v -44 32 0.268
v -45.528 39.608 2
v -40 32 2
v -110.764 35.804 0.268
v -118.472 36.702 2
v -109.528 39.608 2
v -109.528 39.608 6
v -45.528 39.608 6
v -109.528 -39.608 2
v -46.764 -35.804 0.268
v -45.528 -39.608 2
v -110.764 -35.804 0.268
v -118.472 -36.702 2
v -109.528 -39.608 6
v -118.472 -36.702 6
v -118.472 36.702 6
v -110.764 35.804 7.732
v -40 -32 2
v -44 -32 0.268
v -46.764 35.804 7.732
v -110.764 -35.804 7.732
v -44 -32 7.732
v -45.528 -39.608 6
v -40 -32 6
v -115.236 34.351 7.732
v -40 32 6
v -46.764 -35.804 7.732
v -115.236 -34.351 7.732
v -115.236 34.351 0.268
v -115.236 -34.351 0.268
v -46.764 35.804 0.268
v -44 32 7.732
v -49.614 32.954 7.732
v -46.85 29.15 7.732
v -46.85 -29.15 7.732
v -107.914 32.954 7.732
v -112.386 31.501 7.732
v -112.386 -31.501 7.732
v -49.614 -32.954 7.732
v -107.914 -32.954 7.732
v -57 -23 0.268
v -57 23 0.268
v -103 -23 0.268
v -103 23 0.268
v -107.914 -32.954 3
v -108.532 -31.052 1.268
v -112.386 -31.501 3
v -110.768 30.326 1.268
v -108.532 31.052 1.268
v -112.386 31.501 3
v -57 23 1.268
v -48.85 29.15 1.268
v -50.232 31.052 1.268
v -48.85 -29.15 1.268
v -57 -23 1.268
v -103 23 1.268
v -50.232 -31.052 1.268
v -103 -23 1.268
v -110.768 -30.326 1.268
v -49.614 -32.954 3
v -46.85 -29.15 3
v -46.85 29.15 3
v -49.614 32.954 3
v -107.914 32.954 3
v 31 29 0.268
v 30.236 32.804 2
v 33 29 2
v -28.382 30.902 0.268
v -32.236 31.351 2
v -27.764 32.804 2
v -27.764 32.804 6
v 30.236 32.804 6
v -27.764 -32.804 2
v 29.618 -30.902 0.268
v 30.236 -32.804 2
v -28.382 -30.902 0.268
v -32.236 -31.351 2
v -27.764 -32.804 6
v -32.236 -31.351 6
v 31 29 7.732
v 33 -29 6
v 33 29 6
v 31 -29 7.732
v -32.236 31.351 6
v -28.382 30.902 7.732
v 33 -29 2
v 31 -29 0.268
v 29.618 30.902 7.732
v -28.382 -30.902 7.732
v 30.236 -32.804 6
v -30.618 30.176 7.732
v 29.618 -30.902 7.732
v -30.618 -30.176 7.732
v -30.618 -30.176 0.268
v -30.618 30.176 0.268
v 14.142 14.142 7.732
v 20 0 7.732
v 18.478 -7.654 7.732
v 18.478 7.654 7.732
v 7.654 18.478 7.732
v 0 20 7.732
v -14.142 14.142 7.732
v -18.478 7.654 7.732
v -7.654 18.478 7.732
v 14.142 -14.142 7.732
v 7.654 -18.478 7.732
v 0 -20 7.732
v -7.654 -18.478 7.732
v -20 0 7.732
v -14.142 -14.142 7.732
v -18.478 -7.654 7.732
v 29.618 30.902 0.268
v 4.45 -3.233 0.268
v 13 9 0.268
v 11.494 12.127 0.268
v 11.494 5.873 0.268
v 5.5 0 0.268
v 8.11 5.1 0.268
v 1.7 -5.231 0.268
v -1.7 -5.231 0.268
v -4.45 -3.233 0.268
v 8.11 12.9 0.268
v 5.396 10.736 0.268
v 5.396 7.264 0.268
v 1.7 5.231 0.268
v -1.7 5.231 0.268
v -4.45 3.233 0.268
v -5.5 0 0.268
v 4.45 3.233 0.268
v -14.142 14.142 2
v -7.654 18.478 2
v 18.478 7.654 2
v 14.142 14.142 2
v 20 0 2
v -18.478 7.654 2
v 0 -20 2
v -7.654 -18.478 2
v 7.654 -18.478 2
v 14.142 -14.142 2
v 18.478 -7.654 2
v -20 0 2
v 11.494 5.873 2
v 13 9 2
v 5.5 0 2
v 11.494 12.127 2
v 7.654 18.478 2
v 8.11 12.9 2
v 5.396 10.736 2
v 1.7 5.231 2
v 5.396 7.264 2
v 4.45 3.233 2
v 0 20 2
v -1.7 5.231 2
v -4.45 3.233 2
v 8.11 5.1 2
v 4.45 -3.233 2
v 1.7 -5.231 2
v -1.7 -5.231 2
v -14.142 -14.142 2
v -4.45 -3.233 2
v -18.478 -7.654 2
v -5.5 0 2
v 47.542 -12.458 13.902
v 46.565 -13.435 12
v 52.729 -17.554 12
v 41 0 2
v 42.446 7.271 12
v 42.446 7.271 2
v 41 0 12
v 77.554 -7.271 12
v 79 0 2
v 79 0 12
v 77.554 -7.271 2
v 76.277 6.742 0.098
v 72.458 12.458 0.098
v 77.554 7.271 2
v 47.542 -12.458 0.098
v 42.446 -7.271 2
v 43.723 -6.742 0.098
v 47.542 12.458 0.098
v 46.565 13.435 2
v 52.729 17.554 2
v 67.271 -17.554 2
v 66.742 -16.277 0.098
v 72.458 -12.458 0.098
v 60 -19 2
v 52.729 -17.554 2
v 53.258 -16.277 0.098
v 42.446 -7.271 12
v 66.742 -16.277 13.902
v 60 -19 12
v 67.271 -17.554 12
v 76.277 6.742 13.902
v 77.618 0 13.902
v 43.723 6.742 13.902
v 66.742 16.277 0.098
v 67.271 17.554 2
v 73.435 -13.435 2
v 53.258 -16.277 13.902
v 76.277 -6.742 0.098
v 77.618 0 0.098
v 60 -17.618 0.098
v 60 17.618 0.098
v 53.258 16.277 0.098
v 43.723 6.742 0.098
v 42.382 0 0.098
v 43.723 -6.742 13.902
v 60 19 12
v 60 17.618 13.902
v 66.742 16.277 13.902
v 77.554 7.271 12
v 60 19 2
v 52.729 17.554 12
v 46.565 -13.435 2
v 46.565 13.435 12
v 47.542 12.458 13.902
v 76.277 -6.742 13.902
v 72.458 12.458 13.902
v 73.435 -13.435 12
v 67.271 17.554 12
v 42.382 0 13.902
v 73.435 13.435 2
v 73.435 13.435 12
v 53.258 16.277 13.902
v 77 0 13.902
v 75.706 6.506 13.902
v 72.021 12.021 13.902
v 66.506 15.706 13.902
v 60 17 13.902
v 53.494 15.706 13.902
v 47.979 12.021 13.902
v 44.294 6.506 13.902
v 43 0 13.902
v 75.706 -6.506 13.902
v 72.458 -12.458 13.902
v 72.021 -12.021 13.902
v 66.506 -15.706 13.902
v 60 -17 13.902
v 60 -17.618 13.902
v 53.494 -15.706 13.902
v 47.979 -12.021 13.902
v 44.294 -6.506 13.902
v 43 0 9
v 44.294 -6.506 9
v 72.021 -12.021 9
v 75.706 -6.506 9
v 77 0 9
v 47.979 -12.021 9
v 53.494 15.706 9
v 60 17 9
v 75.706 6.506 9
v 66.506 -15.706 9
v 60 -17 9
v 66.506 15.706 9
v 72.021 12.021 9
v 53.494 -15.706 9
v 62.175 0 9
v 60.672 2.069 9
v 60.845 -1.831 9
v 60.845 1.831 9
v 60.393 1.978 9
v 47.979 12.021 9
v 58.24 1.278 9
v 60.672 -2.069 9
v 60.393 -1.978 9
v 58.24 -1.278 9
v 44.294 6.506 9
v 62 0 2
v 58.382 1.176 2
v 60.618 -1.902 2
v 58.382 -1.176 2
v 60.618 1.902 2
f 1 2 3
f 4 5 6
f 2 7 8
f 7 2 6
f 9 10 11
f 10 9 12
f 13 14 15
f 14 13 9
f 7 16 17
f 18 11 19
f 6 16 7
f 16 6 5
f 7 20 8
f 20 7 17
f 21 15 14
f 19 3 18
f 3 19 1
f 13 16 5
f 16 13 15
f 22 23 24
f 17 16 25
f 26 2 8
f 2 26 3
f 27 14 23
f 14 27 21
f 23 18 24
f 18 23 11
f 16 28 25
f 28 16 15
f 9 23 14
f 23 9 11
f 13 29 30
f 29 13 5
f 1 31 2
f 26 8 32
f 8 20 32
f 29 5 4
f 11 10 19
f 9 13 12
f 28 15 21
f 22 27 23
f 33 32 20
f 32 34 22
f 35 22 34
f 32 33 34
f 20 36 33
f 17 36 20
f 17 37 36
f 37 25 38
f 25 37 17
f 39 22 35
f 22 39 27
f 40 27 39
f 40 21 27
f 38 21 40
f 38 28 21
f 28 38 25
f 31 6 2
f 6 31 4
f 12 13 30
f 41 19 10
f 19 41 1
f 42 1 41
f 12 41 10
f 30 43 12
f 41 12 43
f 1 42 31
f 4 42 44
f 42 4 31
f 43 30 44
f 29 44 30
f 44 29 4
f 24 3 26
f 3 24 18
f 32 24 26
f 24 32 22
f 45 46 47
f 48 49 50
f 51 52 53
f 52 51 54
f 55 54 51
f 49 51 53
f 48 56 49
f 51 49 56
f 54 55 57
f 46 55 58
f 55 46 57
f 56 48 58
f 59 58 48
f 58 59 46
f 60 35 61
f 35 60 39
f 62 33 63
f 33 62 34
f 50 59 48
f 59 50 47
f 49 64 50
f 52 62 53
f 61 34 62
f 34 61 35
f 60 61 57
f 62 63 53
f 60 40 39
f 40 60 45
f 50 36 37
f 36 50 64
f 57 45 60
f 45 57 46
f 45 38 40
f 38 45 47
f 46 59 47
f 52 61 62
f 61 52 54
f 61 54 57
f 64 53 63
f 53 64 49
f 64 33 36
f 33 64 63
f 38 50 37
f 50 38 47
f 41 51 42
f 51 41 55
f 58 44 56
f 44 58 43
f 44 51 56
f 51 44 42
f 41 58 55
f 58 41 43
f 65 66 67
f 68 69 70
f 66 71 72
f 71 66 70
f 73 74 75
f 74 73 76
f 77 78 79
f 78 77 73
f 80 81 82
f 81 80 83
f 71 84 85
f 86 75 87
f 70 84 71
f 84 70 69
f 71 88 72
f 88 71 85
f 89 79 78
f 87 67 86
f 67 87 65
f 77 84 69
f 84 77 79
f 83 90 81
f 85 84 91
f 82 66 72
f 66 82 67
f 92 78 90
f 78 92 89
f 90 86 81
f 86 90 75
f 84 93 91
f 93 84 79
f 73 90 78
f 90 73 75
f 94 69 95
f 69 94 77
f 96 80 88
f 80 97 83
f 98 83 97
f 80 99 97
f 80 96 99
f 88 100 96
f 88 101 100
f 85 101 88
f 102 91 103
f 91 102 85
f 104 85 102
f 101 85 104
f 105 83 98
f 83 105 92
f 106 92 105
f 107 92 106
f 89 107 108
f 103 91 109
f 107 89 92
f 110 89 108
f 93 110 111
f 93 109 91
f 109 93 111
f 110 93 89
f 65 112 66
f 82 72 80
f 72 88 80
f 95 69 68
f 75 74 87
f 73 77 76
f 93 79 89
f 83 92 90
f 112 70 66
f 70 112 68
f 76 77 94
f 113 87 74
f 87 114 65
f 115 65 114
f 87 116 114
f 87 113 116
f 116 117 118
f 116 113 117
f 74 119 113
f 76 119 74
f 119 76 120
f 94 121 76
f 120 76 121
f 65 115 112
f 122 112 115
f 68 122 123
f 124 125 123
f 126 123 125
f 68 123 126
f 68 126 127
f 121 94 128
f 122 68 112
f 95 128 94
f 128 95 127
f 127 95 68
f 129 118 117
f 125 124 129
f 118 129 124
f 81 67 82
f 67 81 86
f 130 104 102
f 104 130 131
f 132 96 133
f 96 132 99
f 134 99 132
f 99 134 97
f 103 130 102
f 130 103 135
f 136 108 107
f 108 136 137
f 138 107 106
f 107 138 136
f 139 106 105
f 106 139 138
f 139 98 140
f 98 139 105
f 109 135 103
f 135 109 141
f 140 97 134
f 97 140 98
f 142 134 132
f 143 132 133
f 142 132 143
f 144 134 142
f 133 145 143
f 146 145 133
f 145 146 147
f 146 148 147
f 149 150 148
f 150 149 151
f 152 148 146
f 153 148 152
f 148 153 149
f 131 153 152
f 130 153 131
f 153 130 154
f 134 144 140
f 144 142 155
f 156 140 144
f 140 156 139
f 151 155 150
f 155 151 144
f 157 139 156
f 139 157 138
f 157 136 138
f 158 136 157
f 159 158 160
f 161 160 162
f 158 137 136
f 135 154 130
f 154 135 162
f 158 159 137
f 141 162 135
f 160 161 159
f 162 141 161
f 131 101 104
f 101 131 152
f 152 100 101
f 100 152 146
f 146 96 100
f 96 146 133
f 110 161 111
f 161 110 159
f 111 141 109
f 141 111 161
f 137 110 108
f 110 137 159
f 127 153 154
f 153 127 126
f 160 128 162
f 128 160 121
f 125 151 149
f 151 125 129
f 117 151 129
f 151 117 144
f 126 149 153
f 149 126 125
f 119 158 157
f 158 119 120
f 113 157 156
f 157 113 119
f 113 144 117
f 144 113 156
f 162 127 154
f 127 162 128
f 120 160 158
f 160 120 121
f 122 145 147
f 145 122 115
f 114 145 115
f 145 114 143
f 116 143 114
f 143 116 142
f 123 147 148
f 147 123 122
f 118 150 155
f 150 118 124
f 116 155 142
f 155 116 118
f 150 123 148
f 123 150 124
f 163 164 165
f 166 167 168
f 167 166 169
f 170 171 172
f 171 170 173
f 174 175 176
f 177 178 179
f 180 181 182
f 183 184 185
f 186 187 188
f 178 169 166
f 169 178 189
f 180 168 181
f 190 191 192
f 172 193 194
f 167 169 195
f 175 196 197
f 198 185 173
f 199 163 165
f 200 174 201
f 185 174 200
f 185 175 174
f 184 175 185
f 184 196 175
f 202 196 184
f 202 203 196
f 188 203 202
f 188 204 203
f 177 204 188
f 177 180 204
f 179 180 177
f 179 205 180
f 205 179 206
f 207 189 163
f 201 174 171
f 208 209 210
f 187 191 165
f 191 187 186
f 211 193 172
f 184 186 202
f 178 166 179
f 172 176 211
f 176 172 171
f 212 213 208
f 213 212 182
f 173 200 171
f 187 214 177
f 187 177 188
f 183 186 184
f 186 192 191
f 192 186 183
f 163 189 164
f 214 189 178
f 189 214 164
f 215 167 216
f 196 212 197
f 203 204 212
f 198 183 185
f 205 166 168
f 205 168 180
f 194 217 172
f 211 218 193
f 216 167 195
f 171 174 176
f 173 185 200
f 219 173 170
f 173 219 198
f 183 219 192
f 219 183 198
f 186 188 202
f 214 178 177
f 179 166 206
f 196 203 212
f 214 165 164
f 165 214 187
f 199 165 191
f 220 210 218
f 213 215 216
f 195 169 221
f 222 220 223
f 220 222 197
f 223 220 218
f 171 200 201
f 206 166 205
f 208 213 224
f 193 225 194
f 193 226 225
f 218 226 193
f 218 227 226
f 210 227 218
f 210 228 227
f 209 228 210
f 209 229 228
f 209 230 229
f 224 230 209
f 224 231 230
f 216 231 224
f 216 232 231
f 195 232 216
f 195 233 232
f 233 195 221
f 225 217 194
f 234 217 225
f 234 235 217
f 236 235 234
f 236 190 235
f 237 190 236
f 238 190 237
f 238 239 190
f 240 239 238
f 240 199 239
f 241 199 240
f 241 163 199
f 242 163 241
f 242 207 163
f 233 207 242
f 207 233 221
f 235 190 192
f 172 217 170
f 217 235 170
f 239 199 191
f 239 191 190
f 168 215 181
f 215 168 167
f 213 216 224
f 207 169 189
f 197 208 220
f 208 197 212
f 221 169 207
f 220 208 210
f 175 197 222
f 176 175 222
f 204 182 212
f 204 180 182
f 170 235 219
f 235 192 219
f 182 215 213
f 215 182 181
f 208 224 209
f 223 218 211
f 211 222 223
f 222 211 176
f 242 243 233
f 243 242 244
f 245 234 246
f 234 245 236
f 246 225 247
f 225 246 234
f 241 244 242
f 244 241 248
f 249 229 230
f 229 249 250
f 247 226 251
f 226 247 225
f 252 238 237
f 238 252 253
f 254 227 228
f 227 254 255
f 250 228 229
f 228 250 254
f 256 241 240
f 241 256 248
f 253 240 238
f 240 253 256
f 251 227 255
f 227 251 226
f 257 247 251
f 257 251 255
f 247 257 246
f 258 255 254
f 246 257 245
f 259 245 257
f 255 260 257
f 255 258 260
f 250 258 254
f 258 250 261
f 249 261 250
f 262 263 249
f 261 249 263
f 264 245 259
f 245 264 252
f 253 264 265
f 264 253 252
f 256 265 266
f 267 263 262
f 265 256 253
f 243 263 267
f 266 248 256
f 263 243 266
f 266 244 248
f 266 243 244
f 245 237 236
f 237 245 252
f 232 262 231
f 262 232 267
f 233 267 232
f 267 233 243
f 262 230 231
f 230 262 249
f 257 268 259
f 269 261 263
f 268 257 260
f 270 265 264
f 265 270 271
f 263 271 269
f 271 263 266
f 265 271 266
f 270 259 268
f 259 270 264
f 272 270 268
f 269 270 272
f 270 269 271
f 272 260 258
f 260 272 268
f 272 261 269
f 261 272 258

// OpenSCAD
// Light Dimmer Switch Plate and Knob
// (c) 2013 Wouter Robers

Knob="yes";//[yes,no]
KnobDiameter=38;
KnopHoleDiameter=4;


Plate="yes";//[yes,no]
PlateSize=66;
PlateRoundEdge=4;
PlateHoleDiameter=11;
PlateThickness=8;

Rack="yes";//[yes,no]
RackSize=80;
RackRoundEdge=8;
RackThickness=PlateThickness;

Smoothness=8;// [8:Rough,30:Medium,60:Smooth]

$fa=180/Smoothness;
$fs=30/Smoothness;


if(Rack=="yes"){
translate([-RackSize,0,0])
difference(){
translate([0,0,RackThickness/2]) scale([RackRoundEdge/2,RackRoundEdge/2,1]) rcube([RackSize/(RackRoundEdge/2),RackSize/(RackRoundEdge/2),RackThickness],2);
translate([0,0,PlateThickness/2+2]) scale([PlateRoundEdge/2,PlateRoundEdge/2,1]) rcube([(PlateSize+0.3)/(PlateRoundEdge/2),(PlateSize+0.3)/(PlateRoundEdge/2),PlateThickness+2],2);
cube(PlateSize-20,center=true);
}
}


if(Plate=="yes"){
difference(){
translate([0,0,PlateThickness/2]) scale([PlateRoundEdge/2,PlateRoundEdge/2,1]) rcube([PlateSize/(PlateRoundEdge/2),PlateSize/(PlateRoundEdge/2),PlateThickness],2);
translate([0,0,2]) cylinder(r=KnobDiameter/2+1,h=PlateThickness);
translate([0,0,-2]) cylinder(r=PlateHoleDiameter/2,h=PlateThickness);
translate([9,9,-2]) cylinder(r=4,h=PlateThickness);
}
}

if(Knob=="yes"){
translate([60,0,14]) rotate([180,0,0])
difference(){
translate([0,0,7]) rcylinder(KnobDiameter/2,KnobDiameter/2,h=14);
translate([0,0,-1]) cylinder(r=KnobDiameter/2-2,h=6);
translate([0,0,4]) cylinder(r1=KnopHoleDiameter/2*1.1,r2=KnopHoleDiameter/2,h=8);
}
}


module rcube(Size=[20,20,20],b=2)
{hull(){for(x=[-(Size[0]/2-b),(Size[0]/2-b)]){for(y=[-(Size[1]/2-b),(Size[1]/2-b)]){for(z=[-(Size[2]/2-b),(Size[2]/2-b)]){ translate([x,y,z]) sphere(b);}}}}}


module rcylinder(r1=10,r2=10,h=10,b=2)
{translate([0,0,-h/2]) hull(){rotate_extrude() translate([r1-b,b,0]) circle(r = b); rotate_extrude() translate([r2-b, h-b, 0]) circle(r = b);}}
